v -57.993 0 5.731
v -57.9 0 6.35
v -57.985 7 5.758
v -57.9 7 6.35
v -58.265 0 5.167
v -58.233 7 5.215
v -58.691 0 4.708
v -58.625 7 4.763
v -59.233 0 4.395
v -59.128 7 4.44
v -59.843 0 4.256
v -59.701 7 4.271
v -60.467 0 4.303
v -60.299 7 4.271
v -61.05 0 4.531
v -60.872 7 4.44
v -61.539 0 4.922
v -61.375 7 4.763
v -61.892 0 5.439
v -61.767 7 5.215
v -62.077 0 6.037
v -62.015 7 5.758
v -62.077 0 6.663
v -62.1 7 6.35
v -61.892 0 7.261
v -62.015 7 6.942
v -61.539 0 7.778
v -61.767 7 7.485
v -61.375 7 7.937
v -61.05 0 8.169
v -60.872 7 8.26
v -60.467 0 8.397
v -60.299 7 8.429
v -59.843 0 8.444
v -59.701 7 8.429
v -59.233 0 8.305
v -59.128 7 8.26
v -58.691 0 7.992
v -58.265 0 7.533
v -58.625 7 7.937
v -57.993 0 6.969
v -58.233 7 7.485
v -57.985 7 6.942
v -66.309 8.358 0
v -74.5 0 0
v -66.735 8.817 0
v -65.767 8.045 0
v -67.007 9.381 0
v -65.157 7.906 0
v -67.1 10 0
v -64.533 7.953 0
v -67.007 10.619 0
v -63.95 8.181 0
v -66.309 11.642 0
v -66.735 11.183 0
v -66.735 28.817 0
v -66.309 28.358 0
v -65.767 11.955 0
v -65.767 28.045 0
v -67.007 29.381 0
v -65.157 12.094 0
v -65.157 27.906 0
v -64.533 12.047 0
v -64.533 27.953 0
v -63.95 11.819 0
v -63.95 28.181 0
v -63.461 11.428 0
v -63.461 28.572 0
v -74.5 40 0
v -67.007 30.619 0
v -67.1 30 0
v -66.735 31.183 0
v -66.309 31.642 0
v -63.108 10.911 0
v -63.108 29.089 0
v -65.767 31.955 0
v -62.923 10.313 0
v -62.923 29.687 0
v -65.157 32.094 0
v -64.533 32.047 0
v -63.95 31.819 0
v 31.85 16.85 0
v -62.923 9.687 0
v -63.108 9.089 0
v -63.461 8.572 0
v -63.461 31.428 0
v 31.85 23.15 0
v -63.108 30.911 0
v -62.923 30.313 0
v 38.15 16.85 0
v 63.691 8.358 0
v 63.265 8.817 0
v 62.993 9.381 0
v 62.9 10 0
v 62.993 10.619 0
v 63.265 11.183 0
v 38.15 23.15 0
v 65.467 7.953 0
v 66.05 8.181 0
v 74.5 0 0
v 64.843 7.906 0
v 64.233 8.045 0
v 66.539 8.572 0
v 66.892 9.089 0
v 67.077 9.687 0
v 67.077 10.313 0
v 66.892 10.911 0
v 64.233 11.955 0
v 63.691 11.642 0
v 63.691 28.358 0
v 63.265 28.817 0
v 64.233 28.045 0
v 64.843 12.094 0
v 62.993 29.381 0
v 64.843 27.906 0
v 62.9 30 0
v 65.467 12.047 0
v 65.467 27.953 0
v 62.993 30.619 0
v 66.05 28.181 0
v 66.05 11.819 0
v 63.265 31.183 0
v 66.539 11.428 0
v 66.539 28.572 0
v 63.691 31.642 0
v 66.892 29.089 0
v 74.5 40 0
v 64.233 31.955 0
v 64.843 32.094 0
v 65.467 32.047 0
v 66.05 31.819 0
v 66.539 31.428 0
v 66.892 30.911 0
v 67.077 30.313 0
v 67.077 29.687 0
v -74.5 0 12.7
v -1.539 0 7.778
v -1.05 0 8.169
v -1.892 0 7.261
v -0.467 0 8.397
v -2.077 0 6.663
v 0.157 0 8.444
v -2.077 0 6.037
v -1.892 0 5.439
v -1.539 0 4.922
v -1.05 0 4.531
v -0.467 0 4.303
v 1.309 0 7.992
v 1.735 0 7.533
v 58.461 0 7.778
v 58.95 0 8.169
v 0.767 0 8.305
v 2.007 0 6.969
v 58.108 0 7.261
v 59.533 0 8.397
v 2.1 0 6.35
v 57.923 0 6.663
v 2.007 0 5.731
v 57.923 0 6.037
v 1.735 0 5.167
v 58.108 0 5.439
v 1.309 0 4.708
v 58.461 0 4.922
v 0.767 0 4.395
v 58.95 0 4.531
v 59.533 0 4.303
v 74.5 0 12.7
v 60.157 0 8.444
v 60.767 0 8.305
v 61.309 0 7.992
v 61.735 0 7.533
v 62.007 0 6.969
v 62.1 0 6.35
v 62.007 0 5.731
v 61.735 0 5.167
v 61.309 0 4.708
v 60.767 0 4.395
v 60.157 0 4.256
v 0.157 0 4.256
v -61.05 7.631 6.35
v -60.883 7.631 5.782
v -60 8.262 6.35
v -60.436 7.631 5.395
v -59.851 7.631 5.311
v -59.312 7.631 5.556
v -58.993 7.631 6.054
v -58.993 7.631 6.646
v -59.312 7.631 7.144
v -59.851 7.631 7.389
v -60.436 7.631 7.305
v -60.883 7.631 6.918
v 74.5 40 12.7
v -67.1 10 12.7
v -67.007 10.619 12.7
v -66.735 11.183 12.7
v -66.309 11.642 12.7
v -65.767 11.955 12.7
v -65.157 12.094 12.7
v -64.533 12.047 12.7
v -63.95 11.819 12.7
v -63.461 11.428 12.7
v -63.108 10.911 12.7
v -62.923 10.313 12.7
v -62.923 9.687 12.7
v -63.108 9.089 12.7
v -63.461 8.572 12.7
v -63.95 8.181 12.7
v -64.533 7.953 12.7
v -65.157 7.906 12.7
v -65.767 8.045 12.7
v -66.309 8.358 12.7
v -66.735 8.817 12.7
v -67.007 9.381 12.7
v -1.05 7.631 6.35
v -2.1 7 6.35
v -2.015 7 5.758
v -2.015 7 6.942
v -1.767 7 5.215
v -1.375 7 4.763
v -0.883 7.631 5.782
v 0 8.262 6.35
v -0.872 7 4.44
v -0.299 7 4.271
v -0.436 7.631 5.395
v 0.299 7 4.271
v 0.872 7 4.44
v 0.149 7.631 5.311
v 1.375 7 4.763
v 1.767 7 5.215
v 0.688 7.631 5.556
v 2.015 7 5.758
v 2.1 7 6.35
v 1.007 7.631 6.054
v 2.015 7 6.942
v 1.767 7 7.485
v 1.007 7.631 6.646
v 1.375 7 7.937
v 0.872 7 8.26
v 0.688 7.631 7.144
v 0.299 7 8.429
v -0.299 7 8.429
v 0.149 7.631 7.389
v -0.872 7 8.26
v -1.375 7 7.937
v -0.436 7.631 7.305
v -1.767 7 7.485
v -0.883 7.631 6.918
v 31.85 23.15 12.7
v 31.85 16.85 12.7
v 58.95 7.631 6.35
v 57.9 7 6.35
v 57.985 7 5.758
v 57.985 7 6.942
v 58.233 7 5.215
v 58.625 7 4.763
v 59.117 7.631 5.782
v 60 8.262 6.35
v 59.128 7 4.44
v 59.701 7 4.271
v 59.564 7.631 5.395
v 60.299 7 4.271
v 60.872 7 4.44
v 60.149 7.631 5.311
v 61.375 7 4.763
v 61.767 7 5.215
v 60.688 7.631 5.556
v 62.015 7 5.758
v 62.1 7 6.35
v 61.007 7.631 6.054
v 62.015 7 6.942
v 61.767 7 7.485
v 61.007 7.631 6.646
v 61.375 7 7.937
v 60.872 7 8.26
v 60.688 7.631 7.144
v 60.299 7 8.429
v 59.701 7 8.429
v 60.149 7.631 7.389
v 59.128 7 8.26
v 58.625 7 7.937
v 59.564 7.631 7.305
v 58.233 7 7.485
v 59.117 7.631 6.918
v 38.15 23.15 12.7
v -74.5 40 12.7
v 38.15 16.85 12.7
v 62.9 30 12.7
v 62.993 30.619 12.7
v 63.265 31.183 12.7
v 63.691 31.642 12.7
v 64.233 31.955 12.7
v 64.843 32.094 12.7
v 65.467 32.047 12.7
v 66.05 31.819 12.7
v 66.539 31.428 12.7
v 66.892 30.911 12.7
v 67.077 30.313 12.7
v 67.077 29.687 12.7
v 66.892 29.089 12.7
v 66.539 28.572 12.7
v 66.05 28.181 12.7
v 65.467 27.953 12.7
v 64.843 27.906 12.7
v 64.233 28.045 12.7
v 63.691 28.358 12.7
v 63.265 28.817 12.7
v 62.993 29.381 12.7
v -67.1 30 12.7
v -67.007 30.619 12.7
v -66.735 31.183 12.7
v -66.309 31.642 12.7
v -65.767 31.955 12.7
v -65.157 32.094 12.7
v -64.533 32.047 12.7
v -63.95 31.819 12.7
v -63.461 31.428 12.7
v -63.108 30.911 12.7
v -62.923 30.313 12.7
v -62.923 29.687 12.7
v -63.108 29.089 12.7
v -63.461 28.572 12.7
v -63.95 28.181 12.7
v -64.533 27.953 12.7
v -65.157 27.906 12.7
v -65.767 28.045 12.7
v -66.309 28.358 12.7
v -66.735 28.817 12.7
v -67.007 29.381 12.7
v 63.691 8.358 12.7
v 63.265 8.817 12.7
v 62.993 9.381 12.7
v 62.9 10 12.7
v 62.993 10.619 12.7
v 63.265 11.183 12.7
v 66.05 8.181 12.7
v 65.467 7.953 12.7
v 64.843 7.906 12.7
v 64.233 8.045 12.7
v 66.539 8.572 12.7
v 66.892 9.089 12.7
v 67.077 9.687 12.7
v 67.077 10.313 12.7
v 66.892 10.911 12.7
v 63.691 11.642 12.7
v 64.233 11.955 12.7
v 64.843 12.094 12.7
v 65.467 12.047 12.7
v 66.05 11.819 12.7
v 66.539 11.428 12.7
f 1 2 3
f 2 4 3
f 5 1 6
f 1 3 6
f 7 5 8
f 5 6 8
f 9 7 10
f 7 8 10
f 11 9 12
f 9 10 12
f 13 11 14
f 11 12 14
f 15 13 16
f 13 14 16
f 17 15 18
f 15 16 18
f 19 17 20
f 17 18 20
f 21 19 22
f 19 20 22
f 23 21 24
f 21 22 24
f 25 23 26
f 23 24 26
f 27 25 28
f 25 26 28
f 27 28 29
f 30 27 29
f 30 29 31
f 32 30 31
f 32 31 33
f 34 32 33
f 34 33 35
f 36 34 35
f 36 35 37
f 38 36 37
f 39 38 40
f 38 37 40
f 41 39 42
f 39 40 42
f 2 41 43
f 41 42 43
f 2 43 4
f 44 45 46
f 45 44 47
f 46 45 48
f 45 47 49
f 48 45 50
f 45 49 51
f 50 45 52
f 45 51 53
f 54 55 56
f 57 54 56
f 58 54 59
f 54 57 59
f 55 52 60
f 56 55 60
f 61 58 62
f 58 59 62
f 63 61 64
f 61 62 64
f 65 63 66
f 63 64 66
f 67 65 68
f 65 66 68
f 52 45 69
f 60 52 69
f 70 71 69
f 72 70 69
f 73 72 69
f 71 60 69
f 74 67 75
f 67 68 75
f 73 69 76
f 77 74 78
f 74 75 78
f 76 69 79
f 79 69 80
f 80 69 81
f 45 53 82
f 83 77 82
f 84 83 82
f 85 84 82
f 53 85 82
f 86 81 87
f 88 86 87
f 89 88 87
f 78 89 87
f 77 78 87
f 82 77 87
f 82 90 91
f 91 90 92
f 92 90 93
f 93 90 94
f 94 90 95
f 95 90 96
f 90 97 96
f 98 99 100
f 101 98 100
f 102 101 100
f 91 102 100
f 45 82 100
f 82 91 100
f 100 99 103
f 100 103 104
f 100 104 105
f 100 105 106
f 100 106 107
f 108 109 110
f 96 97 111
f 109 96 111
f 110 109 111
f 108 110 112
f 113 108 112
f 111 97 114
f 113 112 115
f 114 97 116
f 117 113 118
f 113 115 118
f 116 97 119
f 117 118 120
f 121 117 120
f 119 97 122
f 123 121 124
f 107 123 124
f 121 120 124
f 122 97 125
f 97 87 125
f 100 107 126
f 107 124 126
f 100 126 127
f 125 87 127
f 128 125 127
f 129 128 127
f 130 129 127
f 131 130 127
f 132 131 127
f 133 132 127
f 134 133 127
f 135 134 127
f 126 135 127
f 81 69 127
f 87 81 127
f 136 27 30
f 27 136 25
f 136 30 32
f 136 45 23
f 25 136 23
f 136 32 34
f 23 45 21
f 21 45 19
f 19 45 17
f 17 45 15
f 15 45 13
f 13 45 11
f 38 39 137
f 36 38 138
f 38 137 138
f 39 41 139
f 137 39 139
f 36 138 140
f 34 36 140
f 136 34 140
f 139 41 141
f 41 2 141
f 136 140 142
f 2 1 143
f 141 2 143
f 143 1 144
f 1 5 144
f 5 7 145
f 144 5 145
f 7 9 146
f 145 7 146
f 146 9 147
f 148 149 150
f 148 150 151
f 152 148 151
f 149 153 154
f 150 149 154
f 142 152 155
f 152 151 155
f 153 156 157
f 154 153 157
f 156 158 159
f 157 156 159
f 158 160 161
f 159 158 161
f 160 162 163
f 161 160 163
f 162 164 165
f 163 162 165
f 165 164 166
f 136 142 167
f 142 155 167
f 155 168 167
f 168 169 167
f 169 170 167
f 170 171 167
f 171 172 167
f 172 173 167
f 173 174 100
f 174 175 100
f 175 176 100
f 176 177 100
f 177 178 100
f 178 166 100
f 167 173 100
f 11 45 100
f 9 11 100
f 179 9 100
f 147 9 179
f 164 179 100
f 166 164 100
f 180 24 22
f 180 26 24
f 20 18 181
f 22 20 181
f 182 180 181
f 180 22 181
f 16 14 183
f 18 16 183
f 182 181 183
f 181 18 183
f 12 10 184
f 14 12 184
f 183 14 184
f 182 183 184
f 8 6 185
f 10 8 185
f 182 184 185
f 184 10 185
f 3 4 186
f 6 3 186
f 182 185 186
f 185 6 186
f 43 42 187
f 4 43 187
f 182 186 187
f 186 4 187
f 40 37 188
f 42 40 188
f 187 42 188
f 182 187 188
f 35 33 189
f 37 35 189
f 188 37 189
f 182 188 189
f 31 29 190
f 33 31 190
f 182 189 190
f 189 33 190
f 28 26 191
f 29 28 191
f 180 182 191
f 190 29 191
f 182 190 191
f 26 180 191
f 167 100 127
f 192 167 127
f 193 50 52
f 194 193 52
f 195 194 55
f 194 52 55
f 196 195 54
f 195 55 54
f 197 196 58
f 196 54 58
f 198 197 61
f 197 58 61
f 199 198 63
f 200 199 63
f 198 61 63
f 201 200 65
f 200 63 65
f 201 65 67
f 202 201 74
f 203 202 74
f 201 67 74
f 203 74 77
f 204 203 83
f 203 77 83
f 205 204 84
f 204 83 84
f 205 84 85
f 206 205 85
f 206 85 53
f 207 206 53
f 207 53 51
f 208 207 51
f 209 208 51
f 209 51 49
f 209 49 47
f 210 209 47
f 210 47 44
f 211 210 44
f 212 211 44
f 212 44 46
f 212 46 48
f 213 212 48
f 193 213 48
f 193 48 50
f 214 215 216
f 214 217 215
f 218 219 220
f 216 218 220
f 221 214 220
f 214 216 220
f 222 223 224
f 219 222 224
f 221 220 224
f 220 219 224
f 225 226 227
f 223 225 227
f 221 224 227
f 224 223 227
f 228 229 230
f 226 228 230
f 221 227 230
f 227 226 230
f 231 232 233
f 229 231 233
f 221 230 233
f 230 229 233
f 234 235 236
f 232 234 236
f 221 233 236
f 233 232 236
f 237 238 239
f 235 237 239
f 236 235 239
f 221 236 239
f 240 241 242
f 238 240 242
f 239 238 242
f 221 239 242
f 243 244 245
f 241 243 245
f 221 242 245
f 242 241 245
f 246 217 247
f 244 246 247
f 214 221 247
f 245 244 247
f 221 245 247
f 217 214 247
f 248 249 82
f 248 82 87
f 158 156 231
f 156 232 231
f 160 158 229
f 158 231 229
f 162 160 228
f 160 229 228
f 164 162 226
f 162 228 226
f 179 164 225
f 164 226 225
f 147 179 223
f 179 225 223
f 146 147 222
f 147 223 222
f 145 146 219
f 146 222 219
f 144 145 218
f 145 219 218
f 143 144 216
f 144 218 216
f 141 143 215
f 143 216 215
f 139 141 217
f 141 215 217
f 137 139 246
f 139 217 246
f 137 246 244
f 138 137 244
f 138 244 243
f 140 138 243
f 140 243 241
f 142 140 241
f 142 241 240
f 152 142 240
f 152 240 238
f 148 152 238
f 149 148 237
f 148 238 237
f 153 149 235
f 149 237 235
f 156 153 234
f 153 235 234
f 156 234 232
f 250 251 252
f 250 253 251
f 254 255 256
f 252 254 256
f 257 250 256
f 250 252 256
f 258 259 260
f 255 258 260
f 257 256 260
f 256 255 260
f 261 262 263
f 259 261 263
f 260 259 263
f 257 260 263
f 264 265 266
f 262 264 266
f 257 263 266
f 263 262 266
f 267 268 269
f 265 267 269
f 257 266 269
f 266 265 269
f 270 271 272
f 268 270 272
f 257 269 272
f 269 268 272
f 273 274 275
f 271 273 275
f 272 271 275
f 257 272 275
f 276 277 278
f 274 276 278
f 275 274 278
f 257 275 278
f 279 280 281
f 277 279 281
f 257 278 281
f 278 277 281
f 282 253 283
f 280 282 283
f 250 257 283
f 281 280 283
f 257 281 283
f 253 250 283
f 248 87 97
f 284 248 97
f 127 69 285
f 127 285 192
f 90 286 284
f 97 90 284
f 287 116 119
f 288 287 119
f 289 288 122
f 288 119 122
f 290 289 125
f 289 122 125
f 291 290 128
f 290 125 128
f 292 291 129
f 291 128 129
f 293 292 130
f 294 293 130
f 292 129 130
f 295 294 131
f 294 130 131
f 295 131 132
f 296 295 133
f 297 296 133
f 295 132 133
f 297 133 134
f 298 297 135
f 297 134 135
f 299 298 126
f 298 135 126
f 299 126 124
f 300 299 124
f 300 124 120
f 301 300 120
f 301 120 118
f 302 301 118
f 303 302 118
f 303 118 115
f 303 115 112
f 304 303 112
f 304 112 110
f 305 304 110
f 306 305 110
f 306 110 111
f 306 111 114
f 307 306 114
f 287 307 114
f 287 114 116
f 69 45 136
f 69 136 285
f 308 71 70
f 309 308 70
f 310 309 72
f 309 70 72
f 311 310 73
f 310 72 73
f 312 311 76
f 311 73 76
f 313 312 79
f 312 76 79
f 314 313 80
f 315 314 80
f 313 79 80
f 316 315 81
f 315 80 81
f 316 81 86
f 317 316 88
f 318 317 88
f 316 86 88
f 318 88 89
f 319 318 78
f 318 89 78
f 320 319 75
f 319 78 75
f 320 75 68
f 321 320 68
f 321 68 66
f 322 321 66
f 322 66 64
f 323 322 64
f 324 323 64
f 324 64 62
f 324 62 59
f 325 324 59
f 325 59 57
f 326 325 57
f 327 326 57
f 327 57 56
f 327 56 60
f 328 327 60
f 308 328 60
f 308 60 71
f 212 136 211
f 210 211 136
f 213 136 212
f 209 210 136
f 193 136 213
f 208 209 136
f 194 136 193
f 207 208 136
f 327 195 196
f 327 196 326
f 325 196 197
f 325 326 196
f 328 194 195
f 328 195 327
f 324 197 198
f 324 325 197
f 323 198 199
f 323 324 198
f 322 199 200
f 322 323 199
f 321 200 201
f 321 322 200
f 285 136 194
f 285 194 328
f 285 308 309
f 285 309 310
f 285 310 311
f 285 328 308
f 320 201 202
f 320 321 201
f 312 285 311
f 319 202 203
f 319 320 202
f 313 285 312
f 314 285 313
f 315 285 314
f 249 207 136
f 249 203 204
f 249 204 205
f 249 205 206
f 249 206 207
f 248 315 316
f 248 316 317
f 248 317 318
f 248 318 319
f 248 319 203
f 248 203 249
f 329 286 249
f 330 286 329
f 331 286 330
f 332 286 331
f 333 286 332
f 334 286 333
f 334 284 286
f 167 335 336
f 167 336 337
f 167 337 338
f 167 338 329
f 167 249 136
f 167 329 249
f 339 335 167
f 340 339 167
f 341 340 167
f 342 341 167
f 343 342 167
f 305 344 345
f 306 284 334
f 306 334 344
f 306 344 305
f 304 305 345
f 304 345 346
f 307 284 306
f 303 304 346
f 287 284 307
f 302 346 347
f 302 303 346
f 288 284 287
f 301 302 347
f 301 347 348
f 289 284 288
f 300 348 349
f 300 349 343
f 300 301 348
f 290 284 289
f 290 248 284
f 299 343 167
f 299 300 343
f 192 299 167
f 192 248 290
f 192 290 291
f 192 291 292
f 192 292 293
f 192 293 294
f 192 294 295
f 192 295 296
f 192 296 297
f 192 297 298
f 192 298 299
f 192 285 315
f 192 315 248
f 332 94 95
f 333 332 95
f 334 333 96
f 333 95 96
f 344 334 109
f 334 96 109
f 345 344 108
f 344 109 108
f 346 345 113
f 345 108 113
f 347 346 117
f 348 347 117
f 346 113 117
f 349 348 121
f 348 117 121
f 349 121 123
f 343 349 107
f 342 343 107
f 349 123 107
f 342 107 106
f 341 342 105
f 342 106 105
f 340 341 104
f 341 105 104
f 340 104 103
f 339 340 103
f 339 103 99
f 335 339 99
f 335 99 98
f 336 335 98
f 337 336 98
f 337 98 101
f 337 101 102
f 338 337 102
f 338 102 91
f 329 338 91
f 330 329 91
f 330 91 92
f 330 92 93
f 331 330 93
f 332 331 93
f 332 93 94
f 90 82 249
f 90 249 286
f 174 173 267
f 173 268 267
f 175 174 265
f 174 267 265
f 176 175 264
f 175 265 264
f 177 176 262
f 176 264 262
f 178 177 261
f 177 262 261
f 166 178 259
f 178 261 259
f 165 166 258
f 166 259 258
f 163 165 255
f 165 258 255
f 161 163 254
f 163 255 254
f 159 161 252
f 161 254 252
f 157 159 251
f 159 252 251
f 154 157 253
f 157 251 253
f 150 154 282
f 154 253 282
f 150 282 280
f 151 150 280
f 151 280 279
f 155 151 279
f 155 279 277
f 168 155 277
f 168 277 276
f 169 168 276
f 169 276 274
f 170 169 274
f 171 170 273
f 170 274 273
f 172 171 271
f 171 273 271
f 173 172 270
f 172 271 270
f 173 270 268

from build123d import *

# Parameters (mm, degrees)
SKETCH1_W                       = 149
SKETCH1_H                       = 40
SKETCH1_W_2                     = 6.3
SKETCH1_H_2                     = 6.3
BOSS_EXTRUDE1_DEPTH             = 12.7
TAP_DRILL_FOR_M5X0_8_TAP2_D     = 4.2
TAP_DRILL_FOR_M5X0_8_TAP2_DEPTH = 7
TAP_DRILL_FOR_M5X0_8_TAP2_TIP   = 1.2618073
TAP_DRILL_FOR_M5X0_8_TAP3_D     = 4.2


with BuildPart() as part:
    # Sketch1 → Boss-Extrude1 (new body)
    with BuildSketch(Plane.XY):
        with Locations((0, 20)):
            Rectangle(SKETCH1_W, SKETCH1_H)
        with Locations((35, 20)):
            Rectangle(SKETCH1_W_2, SKETCH1_H_2, mode=Mode.SUBTRACT)
    extrude(amount=BOSS_EXTRUDE1_DEPTH)

    # Tap Drill for M5x0.8 Tap2
    with Locations(Plane(origin=(-60, 0, 6.35), x_dir=(-1, 0, 0), z_dir=(0, -1, 0))):
        with Locations((0, 0), (-60, 0), (-120, 0)):
            Hole(TAP_DRILL_FOR_M5X0_8_TAP2_D / 2, depth=TAP_DRILL_FOR_M5X0_8_TAP2_DEPTH)
            with Locations((0, 0, -(TAP_DRILL_FOR_M5X0_8_TAP2_DEPTH + TAP_DRILL_FOR_M5X0_8_TAP2_TIP / 2))):  # 118° drill point
                Cone(0, TAP_DRILL_FOR_M5X0_8_TAP2_D / 2, TAP_DRILL_FOR_M5X0_8_TAP2_TIP, mode=Mode.SUBTRACT)

    # Tap Drill for M5x0.8 Tap3 (through all)
    with Locations(Plane.XY.offset(12.7)):
        with Locations((-65, 30), (-65, 10), (65, 10), (65, 30)):
            Hole(TAP_DRILL_FOR_M5X0_8_TAP3_D / 2)


solid = part.part
